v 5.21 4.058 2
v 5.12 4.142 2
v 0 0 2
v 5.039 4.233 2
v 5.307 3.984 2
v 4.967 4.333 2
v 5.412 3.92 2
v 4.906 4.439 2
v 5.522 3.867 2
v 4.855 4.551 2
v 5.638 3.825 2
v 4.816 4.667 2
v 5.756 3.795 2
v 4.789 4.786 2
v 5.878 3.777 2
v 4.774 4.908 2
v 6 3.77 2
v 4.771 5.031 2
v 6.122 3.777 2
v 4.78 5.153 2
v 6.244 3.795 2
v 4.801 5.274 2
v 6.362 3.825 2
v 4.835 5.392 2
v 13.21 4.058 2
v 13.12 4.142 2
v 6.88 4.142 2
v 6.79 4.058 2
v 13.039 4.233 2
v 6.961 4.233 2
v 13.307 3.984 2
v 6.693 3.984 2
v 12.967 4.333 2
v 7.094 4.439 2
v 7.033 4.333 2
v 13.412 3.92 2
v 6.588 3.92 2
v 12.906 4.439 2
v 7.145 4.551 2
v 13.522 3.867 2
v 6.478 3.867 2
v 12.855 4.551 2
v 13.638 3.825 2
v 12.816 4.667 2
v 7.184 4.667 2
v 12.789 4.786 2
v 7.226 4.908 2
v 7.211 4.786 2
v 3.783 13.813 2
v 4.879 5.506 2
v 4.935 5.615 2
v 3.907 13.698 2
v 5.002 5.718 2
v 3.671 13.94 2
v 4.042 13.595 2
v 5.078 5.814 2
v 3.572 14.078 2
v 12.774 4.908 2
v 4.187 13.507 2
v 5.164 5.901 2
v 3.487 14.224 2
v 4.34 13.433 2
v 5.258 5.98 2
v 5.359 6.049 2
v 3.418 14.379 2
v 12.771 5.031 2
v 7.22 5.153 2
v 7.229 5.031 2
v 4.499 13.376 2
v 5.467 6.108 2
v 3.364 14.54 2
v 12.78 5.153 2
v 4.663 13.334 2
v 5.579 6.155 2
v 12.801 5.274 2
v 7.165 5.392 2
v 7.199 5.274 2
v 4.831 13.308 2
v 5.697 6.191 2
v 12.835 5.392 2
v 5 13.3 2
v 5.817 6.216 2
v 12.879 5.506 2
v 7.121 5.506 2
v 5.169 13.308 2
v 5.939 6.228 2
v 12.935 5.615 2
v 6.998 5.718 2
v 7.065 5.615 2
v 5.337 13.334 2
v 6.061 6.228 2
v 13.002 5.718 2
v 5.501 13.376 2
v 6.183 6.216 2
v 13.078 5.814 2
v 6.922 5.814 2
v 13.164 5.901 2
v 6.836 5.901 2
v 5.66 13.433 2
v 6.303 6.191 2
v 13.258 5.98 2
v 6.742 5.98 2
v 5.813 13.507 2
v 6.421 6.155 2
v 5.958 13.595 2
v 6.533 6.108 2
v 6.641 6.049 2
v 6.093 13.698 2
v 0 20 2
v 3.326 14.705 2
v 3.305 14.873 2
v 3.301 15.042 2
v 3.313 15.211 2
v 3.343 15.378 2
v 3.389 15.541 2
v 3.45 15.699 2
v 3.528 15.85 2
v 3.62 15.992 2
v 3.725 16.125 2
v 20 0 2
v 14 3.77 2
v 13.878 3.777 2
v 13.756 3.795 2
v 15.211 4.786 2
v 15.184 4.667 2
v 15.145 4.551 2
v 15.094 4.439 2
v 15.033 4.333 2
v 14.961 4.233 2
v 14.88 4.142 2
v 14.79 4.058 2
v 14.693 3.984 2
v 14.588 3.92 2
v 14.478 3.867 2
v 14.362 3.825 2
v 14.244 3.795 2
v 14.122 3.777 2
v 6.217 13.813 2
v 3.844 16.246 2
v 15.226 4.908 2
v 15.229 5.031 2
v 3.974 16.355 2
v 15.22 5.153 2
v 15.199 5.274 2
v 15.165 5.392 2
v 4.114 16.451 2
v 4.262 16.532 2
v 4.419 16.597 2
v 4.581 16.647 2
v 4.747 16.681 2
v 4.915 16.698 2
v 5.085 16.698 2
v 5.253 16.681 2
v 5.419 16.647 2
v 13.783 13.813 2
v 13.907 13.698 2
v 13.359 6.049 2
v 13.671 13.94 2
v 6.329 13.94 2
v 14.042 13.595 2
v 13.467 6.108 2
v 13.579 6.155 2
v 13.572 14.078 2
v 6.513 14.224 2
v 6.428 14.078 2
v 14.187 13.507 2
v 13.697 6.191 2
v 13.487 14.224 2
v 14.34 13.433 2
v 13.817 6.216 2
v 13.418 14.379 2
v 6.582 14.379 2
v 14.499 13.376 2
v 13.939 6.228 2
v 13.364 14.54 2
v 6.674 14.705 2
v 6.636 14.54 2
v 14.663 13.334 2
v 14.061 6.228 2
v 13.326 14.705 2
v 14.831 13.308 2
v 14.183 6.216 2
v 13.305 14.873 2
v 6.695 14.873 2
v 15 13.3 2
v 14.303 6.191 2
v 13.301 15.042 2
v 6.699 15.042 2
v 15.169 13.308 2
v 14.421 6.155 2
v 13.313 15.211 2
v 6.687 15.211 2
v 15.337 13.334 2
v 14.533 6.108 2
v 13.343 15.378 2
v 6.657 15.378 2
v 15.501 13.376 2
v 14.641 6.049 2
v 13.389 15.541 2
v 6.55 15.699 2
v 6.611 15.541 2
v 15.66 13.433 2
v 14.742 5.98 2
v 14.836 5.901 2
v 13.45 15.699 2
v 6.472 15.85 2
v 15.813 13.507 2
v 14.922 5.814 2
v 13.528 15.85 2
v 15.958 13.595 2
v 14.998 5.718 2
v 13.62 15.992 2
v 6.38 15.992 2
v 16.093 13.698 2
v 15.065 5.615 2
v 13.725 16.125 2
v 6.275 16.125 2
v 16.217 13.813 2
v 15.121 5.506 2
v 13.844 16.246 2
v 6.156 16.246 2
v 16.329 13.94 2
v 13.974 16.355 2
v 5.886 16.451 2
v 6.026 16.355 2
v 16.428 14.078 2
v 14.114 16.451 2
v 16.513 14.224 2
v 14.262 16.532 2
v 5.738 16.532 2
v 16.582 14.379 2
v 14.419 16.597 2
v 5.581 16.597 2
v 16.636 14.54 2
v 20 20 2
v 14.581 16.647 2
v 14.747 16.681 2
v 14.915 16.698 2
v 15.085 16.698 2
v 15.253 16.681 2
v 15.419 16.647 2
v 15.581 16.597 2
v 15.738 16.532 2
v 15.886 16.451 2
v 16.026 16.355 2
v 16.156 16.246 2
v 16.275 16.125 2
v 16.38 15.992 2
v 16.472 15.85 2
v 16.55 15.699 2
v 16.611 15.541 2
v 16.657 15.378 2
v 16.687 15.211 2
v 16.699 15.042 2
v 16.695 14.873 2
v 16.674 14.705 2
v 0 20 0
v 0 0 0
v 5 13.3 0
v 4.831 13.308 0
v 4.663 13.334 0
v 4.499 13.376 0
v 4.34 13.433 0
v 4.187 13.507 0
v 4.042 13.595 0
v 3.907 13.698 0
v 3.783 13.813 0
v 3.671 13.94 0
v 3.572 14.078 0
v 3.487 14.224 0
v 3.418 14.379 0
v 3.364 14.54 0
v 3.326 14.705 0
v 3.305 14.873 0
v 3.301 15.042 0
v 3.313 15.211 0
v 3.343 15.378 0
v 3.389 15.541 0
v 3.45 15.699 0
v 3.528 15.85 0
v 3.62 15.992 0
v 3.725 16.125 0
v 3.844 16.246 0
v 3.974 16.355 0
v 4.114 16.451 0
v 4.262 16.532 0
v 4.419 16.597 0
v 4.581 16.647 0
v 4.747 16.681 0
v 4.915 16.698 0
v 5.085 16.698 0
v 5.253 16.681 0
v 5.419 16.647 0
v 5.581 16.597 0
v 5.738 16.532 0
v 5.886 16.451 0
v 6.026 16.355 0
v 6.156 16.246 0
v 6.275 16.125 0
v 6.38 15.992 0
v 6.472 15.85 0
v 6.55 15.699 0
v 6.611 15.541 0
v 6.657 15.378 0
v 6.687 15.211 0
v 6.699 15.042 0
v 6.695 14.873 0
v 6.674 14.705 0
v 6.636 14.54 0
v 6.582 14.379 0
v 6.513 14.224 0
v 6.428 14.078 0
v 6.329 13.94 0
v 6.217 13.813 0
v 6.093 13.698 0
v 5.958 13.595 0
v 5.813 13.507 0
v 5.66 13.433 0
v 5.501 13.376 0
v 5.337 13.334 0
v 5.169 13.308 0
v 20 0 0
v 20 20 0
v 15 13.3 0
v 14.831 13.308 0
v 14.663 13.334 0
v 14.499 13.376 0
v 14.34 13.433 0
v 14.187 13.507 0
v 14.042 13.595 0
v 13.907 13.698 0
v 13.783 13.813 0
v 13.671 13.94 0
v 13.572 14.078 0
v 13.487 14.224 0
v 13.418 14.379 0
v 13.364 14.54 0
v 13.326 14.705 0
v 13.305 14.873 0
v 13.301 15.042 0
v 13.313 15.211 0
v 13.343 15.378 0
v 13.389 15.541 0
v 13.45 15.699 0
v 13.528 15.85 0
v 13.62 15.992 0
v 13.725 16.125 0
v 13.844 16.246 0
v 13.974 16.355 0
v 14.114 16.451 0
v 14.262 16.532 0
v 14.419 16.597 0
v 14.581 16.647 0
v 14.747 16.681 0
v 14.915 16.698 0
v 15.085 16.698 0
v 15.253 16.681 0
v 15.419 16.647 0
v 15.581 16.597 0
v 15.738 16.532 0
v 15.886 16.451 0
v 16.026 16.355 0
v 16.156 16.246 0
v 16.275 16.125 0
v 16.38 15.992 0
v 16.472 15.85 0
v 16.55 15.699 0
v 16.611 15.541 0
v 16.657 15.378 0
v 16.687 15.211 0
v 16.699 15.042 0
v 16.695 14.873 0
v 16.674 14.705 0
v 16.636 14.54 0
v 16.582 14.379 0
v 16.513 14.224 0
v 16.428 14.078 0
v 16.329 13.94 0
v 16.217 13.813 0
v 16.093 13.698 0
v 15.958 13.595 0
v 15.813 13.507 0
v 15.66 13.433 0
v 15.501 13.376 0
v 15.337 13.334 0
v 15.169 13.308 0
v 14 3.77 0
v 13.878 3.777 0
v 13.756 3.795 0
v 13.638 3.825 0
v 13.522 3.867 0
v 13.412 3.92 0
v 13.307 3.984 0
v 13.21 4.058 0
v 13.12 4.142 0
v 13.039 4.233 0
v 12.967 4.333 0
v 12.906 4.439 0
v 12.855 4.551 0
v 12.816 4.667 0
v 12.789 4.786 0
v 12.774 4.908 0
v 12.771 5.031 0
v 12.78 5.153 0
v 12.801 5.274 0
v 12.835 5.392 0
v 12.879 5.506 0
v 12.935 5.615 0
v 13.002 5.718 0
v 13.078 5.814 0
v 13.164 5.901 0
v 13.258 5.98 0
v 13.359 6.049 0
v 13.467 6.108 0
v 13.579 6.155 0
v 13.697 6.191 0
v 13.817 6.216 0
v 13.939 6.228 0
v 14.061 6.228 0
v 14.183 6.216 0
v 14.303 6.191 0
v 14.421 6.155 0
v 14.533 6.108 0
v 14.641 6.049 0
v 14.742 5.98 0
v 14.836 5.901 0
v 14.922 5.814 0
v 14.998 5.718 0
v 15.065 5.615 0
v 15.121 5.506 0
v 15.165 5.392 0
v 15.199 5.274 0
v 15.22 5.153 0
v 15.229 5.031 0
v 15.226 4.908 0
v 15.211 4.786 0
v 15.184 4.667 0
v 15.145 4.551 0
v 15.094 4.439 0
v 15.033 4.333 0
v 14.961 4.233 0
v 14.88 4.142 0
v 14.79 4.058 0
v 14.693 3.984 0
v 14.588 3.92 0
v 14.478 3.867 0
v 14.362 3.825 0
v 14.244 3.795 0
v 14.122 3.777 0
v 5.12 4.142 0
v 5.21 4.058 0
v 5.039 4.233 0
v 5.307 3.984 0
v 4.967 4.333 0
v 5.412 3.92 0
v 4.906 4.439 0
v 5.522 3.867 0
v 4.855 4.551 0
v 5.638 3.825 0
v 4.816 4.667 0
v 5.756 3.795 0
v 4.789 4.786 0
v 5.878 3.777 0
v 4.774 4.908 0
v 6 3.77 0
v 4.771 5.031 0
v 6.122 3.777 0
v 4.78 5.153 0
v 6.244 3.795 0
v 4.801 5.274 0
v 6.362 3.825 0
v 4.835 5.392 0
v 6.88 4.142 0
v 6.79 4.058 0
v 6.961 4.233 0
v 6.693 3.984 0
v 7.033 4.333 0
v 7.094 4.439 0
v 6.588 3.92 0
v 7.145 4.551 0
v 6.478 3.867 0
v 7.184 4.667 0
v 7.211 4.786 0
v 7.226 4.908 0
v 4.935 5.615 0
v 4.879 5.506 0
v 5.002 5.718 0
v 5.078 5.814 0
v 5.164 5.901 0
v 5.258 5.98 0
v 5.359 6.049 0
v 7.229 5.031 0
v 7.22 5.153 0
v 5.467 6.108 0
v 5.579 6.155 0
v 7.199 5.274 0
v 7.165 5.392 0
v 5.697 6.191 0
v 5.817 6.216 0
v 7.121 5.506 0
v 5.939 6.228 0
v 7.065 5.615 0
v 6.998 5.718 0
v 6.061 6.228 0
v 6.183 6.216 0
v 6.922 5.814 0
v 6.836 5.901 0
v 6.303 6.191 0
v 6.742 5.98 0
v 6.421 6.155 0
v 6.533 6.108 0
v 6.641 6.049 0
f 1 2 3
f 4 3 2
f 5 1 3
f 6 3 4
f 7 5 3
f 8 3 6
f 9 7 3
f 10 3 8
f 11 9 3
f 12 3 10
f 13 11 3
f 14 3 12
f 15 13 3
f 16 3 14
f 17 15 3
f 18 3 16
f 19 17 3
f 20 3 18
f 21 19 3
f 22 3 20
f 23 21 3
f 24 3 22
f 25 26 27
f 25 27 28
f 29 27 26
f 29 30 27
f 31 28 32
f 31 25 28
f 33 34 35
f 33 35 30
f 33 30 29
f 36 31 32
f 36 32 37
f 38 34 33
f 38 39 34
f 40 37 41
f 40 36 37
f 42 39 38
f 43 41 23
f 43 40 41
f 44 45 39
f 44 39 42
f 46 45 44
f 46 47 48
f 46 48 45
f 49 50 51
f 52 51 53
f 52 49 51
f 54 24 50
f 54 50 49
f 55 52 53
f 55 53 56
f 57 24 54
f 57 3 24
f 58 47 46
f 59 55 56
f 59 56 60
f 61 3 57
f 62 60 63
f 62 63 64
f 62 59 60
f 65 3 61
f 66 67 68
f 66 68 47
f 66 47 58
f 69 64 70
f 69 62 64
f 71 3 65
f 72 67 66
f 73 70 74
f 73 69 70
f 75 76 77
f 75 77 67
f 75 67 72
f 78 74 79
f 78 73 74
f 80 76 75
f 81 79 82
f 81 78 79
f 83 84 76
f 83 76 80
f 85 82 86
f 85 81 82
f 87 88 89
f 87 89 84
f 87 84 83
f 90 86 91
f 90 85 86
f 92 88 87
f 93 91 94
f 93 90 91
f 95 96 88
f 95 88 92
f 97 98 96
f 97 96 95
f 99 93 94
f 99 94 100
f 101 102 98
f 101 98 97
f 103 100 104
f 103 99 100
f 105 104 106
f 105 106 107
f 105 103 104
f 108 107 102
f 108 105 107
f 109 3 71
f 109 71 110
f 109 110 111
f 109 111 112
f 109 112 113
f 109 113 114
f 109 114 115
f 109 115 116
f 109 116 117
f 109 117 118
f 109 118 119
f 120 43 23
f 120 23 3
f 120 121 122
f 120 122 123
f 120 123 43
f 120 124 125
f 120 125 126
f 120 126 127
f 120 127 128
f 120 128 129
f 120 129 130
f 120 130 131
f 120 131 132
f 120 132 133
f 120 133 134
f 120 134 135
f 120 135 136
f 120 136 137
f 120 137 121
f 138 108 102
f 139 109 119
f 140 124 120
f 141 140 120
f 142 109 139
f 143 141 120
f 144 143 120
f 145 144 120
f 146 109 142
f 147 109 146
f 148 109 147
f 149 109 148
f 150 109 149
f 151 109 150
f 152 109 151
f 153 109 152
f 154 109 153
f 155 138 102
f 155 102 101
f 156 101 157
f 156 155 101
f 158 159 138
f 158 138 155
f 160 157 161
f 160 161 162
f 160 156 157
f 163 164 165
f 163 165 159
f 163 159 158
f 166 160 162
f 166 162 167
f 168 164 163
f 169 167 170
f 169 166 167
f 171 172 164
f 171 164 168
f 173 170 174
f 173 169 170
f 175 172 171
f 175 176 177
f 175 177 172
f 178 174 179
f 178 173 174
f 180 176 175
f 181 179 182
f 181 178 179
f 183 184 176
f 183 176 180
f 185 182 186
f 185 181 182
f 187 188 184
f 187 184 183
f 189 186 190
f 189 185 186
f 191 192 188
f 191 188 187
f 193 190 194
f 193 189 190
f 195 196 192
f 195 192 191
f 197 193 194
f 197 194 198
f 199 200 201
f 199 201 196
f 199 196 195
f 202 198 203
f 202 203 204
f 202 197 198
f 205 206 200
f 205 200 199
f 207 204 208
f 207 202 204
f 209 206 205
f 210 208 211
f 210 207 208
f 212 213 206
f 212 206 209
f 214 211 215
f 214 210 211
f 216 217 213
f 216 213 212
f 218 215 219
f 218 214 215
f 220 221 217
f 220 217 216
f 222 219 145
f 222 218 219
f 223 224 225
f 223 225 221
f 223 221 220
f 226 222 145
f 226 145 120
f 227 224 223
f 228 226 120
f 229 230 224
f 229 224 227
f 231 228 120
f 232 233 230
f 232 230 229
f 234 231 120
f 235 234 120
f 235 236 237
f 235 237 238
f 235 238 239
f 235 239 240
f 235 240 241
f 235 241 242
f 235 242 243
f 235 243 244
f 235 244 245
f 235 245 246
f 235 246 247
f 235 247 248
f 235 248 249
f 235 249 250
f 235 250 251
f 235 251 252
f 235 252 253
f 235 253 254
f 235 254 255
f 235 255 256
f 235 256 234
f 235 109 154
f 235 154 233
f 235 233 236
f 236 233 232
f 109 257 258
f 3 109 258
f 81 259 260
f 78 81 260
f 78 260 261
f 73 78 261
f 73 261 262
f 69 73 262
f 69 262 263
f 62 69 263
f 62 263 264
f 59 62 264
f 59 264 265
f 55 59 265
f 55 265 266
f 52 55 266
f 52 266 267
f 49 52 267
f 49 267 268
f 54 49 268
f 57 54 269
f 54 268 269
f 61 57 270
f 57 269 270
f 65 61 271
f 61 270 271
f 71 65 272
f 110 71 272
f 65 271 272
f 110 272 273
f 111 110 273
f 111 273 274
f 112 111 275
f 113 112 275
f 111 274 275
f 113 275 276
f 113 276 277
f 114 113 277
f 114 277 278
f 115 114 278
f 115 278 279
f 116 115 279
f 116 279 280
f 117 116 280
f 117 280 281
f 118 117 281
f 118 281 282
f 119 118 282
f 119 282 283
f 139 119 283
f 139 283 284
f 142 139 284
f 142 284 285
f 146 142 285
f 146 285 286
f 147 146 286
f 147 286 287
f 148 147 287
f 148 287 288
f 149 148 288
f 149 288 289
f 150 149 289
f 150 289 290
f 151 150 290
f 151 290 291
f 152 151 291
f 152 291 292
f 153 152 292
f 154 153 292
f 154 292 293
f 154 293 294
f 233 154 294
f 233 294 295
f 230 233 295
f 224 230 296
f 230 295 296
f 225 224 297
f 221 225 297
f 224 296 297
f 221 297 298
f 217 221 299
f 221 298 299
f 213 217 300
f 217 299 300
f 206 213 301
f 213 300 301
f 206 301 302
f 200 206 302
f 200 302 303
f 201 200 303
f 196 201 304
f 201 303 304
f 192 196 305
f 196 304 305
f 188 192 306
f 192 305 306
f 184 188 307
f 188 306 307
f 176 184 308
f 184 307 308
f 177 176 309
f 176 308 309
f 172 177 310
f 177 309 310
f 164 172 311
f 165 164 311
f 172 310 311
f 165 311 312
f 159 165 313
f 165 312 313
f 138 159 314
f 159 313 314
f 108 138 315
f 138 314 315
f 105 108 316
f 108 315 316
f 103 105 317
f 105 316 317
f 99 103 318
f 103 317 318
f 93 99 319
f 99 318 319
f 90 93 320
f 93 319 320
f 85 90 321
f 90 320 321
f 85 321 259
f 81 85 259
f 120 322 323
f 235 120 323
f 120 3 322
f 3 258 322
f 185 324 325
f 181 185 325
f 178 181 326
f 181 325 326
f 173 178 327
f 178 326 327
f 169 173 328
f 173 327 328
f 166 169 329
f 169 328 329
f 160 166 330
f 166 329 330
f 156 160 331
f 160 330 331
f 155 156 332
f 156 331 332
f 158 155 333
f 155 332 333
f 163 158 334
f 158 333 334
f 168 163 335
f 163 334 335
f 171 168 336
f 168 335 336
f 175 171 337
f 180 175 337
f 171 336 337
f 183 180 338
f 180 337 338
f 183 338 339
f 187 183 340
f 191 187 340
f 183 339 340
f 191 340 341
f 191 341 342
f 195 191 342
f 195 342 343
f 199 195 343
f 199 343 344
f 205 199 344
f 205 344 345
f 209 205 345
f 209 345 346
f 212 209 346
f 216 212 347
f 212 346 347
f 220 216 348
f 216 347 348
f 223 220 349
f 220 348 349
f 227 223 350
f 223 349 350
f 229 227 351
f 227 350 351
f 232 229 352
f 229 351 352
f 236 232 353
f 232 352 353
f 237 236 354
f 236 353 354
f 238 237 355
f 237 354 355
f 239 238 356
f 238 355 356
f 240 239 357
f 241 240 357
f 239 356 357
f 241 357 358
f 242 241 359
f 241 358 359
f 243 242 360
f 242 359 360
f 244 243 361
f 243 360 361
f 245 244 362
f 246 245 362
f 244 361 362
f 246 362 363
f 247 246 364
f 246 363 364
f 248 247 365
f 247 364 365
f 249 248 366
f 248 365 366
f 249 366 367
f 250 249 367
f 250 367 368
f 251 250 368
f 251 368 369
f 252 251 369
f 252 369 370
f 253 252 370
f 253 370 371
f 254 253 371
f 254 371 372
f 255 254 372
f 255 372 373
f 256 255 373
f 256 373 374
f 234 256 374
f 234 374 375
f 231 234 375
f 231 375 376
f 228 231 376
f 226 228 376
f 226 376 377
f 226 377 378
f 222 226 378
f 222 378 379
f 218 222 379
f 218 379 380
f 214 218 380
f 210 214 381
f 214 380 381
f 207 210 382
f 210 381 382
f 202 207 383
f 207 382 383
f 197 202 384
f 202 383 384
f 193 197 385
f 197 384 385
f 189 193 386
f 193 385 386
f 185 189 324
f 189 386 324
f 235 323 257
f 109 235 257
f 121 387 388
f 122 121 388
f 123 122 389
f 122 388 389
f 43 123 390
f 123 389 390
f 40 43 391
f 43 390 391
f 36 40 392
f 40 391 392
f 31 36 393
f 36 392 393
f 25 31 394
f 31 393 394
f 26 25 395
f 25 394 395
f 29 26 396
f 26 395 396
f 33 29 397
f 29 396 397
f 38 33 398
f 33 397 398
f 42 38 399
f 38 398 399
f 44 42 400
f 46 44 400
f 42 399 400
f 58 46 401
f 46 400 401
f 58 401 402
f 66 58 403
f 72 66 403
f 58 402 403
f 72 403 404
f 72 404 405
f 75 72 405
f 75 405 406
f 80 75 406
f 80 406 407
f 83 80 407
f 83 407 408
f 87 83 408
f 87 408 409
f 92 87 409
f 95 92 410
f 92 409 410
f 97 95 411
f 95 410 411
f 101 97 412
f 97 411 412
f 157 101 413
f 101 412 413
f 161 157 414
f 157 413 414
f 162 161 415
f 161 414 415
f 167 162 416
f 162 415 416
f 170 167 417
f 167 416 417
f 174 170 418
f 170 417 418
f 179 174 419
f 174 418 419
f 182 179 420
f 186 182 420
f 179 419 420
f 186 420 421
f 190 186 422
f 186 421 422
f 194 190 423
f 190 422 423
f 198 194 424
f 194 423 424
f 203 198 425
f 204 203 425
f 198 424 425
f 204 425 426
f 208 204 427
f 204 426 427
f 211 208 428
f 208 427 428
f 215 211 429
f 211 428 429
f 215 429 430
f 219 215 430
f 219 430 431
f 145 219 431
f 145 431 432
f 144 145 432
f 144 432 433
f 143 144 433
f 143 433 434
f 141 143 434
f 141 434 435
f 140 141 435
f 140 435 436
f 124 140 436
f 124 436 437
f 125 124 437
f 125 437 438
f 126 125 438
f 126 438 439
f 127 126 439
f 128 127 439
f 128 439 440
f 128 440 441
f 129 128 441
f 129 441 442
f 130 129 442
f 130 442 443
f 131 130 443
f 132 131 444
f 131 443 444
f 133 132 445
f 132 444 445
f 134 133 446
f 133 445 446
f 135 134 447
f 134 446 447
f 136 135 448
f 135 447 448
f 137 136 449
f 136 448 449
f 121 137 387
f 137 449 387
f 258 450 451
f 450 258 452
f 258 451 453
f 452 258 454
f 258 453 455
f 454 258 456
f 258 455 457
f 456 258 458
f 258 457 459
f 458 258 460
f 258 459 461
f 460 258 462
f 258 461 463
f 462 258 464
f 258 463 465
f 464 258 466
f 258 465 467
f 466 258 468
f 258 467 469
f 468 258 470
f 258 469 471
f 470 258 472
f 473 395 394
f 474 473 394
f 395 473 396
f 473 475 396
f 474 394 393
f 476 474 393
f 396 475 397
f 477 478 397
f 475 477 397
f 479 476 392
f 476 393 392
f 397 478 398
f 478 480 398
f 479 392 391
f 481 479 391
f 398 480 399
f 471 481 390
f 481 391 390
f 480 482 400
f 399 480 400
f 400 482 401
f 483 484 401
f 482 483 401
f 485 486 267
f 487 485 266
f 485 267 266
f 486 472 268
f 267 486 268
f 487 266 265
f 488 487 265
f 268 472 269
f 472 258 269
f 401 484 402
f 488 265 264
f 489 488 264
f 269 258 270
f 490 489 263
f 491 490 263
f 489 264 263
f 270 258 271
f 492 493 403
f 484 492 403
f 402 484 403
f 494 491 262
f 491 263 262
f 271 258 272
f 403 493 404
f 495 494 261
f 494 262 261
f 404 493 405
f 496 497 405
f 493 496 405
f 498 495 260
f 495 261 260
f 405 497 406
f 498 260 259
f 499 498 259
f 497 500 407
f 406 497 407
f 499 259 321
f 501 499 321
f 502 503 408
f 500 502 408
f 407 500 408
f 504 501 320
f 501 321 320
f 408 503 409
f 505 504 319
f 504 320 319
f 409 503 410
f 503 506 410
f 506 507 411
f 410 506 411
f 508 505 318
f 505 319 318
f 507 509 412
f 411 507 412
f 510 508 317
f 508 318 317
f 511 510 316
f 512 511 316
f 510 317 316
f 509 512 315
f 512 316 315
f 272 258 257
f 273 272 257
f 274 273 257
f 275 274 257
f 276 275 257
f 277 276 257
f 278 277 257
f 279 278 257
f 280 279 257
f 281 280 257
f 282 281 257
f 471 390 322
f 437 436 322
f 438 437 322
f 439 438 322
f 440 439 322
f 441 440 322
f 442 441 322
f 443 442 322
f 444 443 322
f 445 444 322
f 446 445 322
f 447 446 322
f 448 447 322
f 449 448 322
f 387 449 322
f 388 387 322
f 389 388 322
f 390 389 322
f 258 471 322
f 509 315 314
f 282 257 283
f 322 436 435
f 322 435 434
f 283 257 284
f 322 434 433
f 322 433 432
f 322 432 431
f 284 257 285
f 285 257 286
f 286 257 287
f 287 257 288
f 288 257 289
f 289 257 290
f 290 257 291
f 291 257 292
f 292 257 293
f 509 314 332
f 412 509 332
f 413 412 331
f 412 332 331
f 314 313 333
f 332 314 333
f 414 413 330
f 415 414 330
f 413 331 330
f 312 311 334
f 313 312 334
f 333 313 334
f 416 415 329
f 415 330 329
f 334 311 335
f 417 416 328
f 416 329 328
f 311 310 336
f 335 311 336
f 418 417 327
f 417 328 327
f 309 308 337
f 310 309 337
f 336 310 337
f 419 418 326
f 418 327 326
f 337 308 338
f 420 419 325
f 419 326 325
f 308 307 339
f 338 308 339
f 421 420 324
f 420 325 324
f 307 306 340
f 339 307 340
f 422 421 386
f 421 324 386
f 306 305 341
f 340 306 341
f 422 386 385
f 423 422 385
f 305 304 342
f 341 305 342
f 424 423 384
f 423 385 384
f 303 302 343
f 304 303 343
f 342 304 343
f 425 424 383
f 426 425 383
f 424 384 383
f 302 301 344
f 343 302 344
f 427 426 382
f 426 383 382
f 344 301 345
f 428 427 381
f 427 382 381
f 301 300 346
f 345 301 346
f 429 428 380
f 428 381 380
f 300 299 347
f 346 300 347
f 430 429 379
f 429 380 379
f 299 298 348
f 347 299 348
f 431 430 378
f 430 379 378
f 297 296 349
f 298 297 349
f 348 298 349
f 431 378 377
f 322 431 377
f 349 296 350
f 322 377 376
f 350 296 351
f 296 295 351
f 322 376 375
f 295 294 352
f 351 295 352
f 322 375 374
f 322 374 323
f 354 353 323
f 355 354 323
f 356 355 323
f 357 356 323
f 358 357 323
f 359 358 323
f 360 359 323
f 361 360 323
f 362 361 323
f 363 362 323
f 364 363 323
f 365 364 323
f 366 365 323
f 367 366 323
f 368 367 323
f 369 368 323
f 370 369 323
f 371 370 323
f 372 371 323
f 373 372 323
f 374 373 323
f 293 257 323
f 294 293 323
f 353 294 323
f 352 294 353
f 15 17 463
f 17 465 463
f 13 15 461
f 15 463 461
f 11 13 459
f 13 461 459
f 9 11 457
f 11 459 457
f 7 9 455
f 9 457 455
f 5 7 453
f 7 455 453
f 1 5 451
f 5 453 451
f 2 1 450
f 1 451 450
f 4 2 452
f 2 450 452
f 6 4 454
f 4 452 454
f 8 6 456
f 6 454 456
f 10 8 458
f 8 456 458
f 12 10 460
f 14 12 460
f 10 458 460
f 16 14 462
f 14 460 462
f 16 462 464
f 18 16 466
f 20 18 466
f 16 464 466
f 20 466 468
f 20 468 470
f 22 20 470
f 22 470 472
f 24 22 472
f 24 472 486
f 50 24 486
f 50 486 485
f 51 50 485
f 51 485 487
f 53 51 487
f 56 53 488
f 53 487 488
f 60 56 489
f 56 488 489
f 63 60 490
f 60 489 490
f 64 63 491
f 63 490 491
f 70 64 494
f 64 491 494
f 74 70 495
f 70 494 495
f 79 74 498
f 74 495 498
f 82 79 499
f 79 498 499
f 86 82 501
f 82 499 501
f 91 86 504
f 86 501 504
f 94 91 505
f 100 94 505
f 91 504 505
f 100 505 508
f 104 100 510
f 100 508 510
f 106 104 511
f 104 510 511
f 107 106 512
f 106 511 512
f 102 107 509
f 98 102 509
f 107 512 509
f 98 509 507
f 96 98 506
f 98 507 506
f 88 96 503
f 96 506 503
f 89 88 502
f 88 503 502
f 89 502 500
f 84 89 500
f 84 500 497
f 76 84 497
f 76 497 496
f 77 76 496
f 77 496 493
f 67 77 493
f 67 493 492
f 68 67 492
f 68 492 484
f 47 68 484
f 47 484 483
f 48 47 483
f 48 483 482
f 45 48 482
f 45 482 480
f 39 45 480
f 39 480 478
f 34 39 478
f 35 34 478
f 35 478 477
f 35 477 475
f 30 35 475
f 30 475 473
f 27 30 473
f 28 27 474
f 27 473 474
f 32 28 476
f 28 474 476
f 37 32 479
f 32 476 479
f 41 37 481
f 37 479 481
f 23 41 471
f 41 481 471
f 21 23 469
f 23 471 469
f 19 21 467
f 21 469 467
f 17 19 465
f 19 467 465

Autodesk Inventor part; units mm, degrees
ref_plane "YZ Plane" through (0, 0, 0) normal (1, 0, 0) x (0, 1, 0)
ref_plane "XZ Plane" through (0, 0, 0) normal (0, 1, 0) x (-1, 0, 0)
ref_plane "XY Plane" through (0, 0, 0) normal (0, 0, 1) x (1, 0, 0)
sketch "Skizze1" plane through (0, 0, 0) normal (0, 0, 1) x (1, 0, 0)
  line L0 (0, 0) -> (20, 0)
  line L1 (20, 0) -> (20, 20)
  line L2 (20, 20) -> (0, 20)
  line L3 (0, 20) -> (0, 0)
  dimension "d0" = 20
  dimension "d1" = 20
extrude "Extrusion1" add sketch "Skizze1" along normal blind 2
sketch "Skizze2" plane through (0, 0, 2) normal (0, 0, 1) x (1, 0, 0)
  line L0 (0, 0) -> (0, 20) projected
  line L1 (20, 20) -> (20, 0) projected
  line L2 (0, 20) -> (20, 20) projected
  line L3 (0, 15) -> (20, 15)
  point P0 (5, 15)
  point P1 (15, 15)
  dimension "d4" = 5
  dimension "d5" = 5
  dimension "d6" = 10
hole "Bohrung1" at (5, 15, 2) at (15, 15, 2) direction (0, 0, -1) diameter 3.4 end through all
sketch "Skizze3" plane through (0, 0, 2) normal (0, 0, 1) x (1, 0, 0)
  line L0 (0, 0) -> (0, 20) projected
  line L1 (20, 0) -> (0, 0) projected
  line L2 (20, 20) -> (20, 0) projected
  line L3 (0, 5) -> (20, 5)
  line L4 (10, 0) -> (10, 7.2656)
  point P0 (6, 5)
  point P1 (14, 5)
  dimension "d14" = 8
  dimension "d15" = 5
hole "Bohrung2" at (6, 5, 2) at (14, 5, 2) direction (0, 0, -1) diameter 2.459 end through all thread size "M3x0.5" class "6H" standard "ISO Metric profile"
properties part number "13_0204_071"
